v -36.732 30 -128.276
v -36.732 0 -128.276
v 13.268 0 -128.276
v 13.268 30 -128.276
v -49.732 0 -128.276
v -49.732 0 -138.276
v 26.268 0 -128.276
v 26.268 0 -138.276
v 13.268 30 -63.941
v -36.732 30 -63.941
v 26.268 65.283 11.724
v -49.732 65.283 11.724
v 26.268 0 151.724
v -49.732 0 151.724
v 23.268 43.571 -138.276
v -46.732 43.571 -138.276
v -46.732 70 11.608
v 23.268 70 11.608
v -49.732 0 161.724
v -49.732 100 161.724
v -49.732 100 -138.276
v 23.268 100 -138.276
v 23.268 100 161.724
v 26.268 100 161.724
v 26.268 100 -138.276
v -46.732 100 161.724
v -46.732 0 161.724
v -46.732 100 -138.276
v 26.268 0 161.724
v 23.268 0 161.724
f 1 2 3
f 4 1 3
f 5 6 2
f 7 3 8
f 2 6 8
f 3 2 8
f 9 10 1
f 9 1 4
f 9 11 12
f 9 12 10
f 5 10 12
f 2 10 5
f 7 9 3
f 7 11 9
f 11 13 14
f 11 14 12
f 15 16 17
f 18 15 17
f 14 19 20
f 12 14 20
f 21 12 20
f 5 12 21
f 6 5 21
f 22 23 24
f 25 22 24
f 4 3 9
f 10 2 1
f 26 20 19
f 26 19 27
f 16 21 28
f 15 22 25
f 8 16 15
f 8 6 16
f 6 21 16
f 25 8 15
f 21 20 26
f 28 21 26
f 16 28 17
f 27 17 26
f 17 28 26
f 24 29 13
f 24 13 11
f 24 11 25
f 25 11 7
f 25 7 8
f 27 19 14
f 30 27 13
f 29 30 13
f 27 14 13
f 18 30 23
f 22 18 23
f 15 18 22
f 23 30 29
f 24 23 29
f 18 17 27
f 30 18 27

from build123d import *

# Parameters (mm, degrees)
SKETCH1_W           = 70
SKETCH1_H           = 300
BOSS_EXTRUDE1_DEPTH = 70
SKETCH1_4_W         = 3
SKETCH1_4_H         = 300
BOSS_EXTRUDE2_DEPTH = 100
CUT_EXTRUDE1_DEPTH  = 70
CUT_EXTRUDE2_DEPTH  = 70
CUT_EXTRUDE3_DEPTH  = 205.769718293
SKETCH10_W          = 50
SKETCH10_H          = 70
CUT_EXTRUDE4_DEPTH  = 30


with BuildPart() as part:
    # Sketch1 → Boss-Extrude1 (new body)
    with BuildSketch(Plane(origin=(0, 0, 0), x_dir=(1, 0, 0), z_dir=(0, 1, 0))):
        with Locations((-11.73177624, -11.723954719)):
            Rectangle(SKETCH1_W, SKETCH1_H)
    extrude(amount=BOSS_EXTRUDE1_DEPTH)

    # Sketch1<4> → Boss-Extrude2 (add)
    with BuildSketch(Plane(origin=(0, 0, 0), x_dir=(1, 0, 0), z_dir=(0, 1, 0))):
        with Locations((-48.23177624, -11.723954719)):
            Rectangle(SKETCH1_4_W, SKETCH1_4_H)
        with Locations((24.76822376, -11.723954719)):
            Rectangle(SKETCH1_4_W, SKETCH1_4_H)
    extrude(amount=BOSS_EXTRUDE2_DEPTH)

    # Sketch2 → Cut-Extrude1 (cut)
    with BuildSketch(Plane.ZY.offset(46.73177624)):
        Polygon((161.723954719, 70), (11.608470283, 70), (161.723954719, 0), align=None)
    extrude(amount=-CUT_EXTRUDE1_DEPTH, mode=Mode.SUBTRACT)

    # Sketch3 → Cut-Extrude2 (cut)
    with BuildSketch(Plane.ZY.offset(46.73177624)):
        Polygon((11.608470283, 70), (-138.276045281, 70), (-138.276045281, 43.571315916), align=None)
    extrude(amount=-CUT_EXTRUDE2_DEPTH, mode=Mode.SUBTRACT)

    # Sketch8 → Cut-Extrude3 (cut, through all)
    with BuildSketch(Plane(origin=(26.26822376, 0, 0), x_dir=(0, 0, -1), z_dir=(1, 0, 0))):
        Polygon((-151.723954719, 0), (-11.723954719, 65.283072142), (128.276045281, 0), (-11.723954719, 0), align=None)
    extrude(amount=-CUT_EXTRUDE3_DEPTH, mode=Mode.SUBTRACT)

    # Sketch10 → Cut-Extrude4 (cut)
    with BuildSketch(Plane.XZ):
        with Locations((-11.73177624, -93.276045281)):
            Rectangle(SKETCH10_W, SKETCH10_H)
    extrude(amount=-CUT_EXTRUDE4_DEPTH, mode=Mode.SUBTRACT)


solid = part.part
